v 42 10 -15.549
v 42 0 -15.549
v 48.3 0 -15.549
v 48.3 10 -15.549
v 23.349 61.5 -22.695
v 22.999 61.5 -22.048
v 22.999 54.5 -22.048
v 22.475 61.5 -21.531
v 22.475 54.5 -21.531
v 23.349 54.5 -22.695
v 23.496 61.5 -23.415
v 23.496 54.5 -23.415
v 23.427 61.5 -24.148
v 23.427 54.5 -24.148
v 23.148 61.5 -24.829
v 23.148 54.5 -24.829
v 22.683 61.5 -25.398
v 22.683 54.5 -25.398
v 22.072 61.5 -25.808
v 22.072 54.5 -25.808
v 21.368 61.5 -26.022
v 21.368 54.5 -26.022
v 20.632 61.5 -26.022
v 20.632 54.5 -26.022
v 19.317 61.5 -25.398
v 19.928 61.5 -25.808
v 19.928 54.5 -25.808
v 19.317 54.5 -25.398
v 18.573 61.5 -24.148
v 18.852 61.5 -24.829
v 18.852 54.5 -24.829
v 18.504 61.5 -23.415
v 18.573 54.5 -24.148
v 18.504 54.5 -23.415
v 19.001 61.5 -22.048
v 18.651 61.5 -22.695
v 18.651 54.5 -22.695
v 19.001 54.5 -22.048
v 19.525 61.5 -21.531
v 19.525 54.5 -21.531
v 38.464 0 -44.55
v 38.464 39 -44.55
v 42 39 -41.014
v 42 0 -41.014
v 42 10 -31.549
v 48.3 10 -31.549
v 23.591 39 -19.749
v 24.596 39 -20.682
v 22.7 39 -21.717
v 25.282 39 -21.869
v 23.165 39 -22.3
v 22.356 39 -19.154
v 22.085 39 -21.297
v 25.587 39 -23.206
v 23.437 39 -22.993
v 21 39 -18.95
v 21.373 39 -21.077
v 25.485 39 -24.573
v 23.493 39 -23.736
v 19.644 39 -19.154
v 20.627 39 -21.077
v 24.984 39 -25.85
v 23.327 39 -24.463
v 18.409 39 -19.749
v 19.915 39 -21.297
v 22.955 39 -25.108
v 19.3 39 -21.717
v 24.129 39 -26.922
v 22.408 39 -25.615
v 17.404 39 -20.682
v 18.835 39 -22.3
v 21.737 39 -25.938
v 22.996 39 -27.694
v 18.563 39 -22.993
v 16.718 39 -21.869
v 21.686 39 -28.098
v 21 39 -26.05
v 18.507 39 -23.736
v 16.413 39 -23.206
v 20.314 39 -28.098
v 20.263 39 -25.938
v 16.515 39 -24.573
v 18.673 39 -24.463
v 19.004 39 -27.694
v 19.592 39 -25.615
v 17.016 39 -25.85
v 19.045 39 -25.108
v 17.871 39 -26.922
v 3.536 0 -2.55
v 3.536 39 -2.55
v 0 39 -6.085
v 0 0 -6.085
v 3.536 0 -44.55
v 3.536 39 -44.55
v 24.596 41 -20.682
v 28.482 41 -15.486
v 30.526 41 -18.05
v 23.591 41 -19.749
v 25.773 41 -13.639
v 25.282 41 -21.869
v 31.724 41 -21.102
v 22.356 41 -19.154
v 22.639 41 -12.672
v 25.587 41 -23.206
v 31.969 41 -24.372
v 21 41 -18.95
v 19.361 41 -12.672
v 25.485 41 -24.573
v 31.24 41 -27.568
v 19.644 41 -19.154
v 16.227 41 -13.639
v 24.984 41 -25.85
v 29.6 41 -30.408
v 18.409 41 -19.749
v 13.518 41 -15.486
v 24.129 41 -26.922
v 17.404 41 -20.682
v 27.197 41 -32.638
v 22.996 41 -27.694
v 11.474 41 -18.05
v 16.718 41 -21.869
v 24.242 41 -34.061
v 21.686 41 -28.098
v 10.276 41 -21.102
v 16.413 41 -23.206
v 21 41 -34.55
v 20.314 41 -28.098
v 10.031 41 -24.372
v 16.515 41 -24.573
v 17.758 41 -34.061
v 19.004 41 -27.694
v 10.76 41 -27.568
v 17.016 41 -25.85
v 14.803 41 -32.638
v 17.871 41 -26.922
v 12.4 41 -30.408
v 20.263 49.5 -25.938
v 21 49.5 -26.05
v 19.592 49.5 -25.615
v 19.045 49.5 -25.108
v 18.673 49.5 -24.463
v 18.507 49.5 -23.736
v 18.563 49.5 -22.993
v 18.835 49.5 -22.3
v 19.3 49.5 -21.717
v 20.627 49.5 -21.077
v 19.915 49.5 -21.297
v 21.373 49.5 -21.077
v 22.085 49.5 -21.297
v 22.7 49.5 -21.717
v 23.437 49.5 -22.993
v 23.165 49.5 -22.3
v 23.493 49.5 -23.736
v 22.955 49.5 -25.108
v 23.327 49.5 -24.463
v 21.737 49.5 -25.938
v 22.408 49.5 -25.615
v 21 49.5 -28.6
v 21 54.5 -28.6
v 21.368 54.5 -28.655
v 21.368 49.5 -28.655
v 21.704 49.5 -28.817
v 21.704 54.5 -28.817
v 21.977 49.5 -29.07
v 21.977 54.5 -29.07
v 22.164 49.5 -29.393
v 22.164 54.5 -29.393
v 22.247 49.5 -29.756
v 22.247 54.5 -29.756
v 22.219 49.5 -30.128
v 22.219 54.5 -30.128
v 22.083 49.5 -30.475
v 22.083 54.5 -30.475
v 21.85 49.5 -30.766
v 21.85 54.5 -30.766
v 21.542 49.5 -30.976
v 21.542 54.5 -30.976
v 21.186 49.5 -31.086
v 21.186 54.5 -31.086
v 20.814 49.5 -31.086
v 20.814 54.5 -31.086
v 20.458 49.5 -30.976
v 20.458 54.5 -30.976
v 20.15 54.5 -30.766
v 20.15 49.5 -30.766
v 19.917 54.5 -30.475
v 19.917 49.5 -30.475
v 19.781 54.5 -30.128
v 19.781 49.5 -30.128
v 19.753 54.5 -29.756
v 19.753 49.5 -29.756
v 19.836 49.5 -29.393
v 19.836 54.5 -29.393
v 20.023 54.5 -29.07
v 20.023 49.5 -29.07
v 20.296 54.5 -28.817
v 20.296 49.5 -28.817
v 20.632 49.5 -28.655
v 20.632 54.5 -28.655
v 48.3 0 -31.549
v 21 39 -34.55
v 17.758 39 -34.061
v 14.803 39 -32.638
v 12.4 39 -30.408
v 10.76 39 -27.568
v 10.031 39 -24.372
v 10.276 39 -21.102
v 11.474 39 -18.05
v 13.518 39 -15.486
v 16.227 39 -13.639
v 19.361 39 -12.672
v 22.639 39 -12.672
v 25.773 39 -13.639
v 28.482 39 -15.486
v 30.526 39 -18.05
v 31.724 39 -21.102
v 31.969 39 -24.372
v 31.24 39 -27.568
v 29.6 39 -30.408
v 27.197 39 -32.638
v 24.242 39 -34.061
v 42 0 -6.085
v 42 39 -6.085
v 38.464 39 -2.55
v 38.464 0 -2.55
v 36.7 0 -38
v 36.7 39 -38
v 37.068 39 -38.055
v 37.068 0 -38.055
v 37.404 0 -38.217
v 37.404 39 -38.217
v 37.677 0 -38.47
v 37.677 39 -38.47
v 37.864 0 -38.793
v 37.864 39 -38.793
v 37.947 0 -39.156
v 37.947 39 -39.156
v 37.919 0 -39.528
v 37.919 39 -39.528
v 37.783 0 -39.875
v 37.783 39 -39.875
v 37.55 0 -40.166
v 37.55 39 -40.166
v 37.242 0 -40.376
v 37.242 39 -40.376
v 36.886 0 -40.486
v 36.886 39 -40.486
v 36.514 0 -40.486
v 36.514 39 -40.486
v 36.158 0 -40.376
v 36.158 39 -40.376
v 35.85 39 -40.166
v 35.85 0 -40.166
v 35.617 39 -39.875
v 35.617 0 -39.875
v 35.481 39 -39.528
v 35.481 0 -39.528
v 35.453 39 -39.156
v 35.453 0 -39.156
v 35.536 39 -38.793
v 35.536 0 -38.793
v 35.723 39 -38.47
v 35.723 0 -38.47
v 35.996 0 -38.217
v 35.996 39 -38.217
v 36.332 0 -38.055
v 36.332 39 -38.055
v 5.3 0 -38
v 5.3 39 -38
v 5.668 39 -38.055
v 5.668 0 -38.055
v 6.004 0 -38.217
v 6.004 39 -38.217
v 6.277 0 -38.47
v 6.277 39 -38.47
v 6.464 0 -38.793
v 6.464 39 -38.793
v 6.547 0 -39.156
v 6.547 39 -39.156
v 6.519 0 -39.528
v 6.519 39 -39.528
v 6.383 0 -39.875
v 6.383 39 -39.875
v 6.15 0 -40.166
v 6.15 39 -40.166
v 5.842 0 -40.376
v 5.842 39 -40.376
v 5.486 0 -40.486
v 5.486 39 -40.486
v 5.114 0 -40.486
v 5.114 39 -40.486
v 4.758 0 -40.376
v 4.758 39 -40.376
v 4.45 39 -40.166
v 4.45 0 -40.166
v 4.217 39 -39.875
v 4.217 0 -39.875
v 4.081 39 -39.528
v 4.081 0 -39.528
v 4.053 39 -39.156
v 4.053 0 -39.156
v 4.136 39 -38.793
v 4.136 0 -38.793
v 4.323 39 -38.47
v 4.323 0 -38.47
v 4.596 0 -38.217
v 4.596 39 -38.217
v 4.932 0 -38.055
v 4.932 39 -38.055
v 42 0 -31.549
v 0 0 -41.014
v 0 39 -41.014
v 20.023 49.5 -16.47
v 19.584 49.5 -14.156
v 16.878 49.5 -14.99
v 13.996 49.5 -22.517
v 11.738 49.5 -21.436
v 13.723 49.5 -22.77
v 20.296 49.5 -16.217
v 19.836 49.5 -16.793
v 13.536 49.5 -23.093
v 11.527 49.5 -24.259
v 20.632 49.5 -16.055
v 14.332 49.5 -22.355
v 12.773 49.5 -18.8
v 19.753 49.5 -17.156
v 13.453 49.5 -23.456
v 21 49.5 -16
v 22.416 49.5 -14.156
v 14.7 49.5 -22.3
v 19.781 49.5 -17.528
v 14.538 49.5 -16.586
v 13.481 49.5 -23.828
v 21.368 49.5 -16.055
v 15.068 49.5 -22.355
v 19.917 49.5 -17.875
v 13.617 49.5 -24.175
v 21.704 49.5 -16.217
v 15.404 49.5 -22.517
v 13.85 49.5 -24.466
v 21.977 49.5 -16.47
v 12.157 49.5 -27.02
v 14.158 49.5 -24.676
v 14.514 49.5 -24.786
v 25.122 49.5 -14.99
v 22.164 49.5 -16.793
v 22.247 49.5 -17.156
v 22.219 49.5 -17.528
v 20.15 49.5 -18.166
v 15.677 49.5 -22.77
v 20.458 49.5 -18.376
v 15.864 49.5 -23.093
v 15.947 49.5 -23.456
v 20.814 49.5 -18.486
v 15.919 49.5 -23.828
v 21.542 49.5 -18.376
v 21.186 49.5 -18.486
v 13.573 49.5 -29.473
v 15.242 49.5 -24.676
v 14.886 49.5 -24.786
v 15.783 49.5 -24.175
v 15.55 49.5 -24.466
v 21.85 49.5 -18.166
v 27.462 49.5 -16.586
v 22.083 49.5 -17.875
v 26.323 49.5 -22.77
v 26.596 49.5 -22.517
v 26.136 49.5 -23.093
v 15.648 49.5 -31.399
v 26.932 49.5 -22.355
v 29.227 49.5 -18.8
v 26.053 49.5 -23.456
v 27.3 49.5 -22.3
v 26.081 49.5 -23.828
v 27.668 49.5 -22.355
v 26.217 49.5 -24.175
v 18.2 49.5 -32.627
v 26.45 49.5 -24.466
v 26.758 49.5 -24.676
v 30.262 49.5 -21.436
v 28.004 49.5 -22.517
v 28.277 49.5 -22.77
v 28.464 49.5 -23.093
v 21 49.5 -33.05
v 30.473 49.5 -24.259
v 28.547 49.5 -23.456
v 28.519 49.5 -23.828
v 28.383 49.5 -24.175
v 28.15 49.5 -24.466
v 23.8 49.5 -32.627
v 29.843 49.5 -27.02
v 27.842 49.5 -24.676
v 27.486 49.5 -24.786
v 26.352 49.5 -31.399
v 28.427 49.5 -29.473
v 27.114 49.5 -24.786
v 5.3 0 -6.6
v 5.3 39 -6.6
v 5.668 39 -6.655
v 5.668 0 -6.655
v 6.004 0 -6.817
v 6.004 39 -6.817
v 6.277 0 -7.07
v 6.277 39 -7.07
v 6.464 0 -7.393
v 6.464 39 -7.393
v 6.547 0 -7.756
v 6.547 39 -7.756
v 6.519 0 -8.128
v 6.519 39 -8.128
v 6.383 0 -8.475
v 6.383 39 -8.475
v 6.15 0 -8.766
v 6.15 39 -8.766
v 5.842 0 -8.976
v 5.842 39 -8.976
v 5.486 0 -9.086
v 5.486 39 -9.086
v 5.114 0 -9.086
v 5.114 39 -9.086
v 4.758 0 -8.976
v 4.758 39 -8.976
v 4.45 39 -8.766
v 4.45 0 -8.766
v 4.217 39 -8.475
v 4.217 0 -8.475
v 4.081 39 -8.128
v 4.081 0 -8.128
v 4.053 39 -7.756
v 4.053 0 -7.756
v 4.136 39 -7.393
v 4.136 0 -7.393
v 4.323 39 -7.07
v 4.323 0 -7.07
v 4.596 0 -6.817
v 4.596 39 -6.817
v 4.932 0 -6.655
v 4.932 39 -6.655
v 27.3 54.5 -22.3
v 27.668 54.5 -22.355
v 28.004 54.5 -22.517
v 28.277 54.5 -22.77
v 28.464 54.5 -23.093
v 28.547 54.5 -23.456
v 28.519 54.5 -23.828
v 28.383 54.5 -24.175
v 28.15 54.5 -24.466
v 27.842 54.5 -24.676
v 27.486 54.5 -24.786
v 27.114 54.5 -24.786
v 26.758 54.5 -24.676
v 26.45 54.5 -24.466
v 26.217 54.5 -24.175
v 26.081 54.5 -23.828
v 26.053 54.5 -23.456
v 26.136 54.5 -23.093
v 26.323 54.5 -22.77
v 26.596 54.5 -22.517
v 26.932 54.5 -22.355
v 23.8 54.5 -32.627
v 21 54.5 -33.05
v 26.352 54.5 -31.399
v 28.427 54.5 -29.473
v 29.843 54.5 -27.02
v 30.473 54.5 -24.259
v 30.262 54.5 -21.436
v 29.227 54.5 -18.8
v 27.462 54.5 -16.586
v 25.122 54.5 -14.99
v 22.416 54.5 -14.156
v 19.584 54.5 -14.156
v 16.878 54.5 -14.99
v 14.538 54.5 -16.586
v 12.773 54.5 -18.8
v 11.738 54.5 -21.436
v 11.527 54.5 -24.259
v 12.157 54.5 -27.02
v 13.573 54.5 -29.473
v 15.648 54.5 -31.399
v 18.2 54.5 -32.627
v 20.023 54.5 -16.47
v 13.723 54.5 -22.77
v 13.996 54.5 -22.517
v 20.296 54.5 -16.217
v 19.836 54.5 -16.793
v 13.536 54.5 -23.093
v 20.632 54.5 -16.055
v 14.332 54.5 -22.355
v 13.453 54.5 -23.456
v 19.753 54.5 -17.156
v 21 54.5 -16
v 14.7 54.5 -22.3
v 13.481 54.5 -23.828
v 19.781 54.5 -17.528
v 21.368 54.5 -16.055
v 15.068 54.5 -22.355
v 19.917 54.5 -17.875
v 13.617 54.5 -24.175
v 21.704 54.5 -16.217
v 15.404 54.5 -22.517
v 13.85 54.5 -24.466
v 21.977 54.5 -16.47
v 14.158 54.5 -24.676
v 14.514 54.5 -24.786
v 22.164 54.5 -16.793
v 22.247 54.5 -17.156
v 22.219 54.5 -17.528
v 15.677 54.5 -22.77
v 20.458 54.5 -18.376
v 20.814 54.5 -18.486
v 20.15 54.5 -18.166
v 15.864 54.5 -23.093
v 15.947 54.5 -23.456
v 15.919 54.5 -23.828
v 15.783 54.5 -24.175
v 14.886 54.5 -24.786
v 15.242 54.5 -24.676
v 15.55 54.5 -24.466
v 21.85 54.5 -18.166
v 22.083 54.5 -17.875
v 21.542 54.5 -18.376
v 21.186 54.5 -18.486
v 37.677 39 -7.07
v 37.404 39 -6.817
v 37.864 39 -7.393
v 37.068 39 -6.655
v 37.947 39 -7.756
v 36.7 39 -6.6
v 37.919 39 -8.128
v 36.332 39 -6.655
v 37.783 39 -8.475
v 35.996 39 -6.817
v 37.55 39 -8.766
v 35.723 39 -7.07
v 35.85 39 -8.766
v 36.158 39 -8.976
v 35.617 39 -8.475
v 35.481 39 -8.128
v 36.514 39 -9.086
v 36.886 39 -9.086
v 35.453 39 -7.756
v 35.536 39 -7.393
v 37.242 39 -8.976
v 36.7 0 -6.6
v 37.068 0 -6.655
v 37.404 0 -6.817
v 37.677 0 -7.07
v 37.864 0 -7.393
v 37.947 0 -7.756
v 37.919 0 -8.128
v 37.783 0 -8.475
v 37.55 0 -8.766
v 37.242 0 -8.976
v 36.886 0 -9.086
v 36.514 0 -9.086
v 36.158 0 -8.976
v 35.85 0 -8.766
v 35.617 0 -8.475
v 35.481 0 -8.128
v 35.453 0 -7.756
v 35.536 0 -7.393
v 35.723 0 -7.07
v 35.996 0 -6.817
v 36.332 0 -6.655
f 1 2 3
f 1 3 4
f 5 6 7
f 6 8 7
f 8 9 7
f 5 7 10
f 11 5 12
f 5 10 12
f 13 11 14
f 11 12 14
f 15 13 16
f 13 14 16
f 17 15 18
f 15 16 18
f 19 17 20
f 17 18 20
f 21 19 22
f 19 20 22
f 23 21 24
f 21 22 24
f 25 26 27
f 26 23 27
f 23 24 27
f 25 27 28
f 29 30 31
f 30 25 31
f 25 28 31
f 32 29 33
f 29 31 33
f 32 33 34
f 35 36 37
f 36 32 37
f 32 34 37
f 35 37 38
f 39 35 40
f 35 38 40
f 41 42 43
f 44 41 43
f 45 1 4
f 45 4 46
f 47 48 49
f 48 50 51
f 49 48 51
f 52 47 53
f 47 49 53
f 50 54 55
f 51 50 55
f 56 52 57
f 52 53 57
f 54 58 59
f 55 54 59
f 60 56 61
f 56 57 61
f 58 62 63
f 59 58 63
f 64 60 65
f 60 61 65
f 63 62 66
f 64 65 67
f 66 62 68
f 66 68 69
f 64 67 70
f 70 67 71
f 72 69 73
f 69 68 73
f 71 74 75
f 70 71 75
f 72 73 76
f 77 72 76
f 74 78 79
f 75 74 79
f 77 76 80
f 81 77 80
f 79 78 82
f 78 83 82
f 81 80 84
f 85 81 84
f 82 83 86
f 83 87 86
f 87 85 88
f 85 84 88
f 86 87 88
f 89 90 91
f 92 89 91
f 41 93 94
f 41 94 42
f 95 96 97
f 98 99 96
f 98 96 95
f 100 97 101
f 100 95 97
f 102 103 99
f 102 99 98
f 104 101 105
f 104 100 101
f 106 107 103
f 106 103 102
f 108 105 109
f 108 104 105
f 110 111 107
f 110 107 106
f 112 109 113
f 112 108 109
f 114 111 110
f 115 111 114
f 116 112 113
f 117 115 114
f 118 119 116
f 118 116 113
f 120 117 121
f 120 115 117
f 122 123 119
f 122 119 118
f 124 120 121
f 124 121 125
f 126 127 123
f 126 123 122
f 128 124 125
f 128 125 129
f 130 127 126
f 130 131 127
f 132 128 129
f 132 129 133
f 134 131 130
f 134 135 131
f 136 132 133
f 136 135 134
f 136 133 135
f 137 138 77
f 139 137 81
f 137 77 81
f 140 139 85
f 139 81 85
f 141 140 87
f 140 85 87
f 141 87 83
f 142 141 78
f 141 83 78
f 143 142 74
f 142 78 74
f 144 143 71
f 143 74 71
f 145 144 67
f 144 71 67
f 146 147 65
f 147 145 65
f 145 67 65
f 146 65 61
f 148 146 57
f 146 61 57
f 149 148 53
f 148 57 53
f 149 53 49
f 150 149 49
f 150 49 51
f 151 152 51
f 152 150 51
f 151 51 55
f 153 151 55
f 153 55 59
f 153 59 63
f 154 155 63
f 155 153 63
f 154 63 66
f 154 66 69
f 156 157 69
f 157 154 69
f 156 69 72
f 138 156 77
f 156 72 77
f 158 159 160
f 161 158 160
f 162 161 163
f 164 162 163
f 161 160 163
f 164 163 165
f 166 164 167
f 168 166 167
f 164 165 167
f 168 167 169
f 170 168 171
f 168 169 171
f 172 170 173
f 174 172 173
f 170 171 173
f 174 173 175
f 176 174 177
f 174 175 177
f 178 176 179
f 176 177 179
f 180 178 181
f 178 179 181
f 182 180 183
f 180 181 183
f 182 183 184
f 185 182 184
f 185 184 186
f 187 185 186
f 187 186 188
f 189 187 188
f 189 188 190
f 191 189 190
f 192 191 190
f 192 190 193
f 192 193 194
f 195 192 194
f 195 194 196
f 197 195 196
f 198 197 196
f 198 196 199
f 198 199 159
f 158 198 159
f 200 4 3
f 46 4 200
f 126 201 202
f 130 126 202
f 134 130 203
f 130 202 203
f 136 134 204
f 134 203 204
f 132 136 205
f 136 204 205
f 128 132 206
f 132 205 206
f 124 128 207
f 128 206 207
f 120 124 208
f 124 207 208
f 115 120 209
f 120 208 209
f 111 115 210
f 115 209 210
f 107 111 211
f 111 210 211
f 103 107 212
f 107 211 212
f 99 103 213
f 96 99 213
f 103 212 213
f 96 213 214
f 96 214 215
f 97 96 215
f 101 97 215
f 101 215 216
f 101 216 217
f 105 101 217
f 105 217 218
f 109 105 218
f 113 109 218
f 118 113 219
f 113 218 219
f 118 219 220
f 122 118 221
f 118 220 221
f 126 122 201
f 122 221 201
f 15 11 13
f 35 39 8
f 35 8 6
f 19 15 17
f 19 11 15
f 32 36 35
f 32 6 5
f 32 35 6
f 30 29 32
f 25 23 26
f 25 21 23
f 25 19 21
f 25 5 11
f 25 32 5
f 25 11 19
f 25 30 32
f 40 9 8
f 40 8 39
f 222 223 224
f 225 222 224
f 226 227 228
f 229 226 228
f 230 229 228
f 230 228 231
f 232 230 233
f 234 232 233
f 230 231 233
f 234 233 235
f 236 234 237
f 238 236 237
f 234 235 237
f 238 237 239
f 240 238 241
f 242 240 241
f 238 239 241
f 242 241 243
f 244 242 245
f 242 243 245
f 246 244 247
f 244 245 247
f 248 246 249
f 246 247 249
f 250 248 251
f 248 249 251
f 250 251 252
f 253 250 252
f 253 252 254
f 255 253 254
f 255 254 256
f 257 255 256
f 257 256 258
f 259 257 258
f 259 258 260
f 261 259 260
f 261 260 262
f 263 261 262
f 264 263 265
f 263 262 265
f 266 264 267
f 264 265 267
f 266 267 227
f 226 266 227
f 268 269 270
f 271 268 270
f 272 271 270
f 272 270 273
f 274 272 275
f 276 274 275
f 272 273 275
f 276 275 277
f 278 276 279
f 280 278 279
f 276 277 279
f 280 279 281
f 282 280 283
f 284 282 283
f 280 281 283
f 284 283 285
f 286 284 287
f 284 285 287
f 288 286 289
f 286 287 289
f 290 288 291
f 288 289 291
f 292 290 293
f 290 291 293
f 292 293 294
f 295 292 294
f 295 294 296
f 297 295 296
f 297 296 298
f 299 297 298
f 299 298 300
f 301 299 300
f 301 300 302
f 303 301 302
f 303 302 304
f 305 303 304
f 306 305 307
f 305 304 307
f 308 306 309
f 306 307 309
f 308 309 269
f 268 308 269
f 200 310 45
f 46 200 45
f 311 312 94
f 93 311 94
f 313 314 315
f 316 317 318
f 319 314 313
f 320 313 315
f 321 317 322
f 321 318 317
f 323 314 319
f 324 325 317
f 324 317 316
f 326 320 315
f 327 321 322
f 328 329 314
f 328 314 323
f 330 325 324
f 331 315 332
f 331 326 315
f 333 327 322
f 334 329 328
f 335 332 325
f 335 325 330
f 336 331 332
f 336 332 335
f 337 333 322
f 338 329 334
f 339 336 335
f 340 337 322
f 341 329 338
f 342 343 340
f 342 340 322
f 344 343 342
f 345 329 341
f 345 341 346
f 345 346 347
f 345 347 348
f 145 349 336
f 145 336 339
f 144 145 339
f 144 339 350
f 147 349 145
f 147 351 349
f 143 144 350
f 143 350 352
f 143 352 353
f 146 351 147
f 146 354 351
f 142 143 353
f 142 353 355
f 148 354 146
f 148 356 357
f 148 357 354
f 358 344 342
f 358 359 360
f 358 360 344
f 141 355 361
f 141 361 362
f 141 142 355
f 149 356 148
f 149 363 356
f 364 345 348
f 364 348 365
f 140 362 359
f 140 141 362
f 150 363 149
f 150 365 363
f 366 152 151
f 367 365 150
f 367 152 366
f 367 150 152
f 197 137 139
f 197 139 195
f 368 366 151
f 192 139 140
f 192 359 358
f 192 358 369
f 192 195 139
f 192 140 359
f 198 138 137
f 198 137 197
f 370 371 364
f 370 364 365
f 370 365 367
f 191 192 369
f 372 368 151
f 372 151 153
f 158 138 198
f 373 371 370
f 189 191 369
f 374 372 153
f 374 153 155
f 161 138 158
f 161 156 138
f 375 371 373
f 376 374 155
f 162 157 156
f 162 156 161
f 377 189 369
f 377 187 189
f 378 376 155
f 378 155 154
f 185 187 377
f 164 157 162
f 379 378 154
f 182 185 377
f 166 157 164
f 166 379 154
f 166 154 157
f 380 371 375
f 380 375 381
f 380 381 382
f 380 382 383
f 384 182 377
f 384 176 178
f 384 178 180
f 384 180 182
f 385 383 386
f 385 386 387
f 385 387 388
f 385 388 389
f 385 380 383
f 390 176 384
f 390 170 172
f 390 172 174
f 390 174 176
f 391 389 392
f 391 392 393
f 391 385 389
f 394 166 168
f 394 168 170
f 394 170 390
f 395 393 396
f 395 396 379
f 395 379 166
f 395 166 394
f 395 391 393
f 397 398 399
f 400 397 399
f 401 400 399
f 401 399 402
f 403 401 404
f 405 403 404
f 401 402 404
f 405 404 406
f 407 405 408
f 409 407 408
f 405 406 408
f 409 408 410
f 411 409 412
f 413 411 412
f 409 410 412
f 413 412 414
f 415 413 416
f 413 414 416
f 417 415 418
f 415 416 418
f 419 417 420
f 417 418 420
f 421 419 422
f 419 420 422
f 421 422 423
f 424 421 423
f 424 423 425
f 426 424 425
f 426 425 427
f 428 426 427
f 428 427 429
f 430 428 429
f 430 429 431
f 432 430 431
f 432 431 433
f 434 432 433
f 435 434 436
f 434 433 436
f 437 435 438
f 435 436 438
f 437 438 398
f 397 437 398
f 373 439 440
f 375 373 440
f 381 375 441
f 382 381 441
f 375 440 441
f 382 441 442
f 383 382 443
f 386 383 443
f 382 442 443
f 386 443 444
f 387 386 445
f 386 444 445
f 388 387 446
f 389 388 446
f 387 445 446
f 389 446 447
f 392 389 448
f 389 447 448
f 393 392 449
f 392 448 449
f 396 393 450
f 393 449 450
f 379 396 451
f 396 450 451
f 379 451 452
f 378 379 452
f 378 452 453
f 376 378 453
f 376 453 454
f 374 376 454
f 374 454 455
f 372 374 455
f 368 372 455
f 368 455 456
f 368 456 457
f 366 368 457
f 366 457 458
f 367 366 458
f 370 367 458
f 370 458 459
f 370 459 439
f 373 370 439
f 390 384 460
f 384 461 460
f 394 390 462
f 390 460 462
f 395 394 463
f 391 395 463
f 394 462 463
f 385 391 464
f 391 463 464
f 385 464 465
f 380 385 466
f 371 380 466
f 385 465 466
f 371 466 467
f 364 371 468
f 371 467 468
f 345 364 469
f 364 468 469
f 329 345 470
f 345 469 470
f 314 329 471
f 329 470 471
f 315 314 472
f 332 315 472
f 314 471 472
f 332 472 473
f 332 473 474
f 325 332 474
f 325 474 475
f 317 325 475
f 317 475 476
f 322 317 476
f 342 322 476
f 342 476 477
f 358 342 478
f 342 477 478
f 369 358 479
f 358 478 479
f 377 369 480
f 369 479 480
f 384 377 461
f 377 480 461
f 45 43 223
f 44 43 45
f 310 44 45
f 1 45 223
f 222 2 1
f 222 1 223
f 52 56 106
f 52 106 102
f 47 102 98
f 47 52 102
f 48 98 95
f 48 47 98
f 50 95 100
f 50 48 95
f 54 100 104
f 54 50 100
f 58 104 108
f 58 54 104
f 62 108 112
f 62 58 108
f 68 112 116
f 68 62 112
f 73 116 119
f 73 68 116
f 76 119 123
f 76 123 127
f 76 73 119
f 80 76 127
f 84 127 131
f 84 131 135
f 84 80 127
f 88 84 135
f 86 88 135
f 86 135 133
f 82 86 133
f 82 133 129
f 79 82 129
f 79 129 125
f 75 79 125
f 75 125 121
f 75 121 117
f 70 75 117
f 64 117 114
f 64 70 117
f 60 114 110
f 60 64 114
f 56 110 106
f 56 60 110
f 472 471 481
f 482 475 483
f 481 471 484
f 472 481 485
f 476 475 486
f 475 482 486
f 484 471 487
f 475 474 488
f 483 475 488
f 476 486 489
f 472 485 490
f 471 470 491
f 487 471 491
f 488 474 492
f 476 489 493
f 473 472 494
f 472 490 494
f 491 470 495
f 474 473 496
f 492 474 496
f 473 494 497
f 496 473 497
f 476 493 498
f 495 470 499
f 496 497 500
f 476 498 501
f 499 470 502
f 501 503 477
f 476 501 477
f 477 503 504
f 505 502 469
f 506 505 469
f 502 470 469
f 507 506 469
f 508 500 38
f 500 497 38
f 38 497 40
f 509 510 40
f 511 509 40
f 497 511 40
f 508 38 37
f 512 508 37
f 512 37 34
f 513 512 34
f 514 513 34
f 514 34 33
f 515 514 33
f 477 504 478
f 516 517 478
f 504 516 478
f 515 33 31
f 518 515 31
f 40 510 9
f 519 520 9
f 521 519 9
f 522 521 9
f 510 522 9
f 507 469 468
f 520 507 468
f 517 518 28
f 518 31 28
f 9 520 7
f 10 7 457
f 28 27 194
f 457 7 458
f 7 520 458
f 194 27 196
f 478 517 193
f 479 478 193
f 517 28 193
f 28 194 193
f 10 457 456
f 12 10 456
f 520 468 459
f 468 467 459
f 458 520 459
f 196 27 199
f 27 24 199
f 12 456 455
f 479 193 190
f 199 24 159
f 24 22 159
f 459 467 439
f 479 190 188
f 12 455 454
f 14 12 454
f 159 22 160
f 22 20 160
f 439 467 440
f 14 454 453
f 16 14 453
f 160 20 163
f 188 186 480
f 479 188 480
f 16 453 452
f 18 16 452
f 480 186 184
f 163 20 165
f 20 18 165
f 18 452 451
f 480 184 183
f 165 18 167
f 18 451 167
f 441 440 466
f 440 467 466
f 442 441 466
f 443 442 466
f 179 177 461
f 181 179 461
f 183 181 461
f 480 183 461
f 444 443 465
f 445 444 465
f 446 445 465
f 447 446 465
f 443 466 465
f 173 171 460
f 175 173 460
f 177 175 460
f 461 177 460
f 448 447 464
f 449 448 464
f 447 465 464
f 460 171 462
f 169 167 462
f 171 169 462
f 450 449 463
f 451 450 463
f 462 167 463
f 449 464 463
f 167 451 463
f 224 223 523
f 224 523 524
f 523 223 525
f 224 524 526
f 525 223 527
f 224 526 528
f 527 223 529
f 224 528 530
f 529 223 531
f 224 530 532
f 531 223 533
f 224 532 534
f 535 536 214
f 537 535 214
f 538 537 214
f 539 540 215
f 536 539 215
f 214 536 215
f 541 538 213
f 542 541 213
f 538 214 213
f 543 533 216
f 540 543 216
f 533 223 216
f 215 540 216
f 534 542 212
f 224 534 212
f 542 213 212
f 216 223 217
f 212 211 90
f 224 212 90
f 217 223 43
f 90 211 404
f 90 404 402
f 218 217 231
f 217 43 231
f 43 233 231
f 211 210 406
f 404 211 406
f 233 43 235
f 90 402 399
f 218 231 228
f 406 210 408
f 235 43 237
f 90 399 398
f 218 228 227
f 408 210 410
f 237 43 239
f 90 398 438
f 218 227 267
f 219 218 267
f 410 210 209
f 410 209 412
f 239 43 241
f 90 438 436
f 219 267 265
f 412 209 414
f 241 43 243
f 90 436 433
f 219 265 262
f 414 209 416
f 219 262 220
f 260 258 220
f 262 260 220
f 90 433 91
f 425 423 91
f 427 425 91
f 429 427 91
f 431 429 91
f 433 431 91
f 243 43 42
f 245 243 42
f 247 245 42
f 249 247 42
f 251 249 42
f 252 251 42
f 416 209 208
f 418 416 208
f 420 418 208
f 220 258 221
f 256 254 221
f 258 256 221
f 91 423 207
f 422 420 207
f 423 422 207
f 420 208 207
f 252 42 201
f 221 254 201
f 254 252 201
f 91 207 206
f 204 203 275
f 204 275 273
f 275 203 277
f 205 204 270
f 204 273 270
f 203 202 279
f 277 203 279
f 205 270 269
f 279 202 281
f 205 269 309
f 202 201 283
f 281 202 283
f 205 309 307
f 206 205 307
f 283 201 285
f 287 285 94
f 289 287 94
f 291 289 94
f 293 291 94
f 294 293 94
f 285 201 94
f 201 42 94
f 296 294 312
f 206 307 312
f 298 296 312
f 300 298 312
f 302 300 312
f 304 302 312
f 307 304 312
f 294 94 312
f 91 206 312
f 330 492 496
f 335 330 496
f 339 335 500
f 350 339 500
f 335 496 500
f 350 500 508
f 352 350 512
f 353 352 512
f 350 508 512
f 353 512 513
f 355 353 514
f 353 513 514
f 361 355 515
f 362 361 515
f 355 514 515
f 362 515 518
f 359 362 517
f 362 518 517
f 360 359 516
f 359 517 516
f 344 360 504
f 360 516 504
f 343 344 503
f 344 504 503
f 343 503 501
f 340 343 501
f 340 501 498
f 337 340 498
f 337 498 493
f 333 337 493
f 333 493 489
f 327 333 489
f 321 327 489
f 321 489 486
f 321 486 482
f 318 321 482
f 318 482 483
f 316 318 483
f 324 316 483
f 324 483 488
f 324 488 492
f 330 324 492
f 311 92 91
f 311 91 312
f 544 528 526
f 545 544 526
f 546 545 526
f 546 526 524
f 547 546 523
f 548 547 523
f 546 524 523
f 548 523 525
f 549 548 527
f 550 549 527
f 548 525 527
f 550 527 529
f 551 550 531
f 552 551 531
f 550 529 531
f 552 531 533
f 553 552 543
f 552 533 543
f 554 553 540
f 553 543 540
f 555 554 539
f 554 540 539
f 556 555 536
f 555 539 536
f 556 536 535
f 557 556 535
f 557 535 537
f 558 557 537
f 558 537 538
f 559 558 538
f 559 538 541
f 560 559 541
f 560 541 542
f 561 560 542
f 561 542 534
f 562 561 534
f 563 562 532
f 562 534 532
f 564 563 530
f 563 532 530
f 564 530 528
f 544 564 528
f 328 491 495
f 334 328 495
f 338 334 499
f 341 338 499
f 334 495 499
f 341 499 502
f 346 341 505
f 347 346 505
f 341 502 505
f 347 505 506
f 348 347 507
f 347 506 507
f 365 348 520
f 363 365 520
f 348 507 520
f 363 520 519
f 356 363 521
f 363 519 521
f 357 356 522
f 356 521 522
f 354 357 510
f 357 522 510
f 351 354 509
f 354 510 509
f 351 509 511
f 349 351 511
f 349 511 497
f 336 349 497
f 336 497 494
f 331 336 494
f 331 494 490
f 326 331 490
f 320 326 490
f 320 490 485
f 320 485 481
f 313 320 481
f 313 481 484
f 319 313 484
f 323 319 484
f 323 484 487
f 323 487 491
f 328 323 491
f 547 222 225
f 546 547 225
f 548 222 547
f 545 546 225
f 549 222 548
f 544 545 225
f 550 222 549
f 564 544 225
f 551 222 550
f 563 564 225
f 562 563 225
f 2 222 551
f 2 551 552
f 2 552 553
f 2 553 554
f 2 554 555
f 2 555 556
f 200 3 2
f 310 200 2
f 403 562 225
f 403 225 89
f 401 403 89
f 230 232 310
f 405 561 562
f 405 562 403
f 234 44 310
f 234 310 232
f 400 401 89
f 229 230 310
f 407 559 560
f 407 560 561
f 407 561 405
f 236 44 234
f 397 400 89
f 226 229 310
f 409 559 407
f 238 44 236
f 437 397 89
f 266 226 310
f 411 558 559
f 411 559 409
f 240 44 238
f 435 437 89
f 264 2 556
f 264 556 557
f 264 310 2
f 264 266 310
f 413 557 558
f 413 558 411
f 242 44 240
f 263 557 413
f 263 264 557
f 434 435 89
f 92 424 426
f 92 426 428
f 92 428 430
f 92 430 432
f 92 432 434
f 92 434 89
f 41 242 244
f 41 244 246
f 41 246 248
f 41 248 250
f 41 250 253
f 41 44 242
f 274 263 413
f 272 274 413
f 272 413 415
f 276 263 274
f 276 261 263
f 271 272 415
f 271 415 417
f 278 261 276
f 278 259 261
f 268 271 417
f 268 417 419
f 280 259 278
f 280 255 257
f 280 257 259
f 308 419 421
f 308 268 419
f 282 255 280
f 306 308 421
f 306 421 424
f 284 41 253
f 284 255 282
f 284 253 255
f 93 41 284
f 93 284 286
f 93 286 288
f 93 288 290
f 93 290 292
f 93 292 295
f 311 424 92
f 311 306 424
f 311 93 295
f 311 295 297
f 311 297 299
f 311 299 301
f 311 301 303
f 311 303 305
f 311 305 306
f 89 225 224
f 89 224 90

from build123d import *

# Parameters (mm, degrees)
BOSS_EXTRU_1_DEPTH      = 39
ESQUISSE2_R             = 1.25
ENL_V_MAT_EXTRU_1_DEPTH = 39
ESQUISSE3_R             = 11
ESQUISSE3_R_2           = 4.6
BOSS_EXTRU_2_DEPTH      = 2
ESQUISSE4_R             = 2.5
BOSS_EXTRU_3_DEPTH      = 22.5
ESQUISSE5_W             = 9.5
ESQUISSE5_H             = 5
ENL_V_MAT_EXTRU_2_REACH = 83.969
ESQUISSE6_R             = 1.25
ENL_V_START             = -7
ENL_V_MAT_EXTRU_4_DEPTH = 7
ESQUISSE9_W             = 16
ESQUISSE9_H             = 10
BOSS_EXTRU_4_DEPTH      = 6.3


with BuildPart() as part:
    # Esquisse1 → Boss.-Extru.1 (new body)
    with BuildSketch(Plane(origin=(0, 0, 0), x_dir=(1, 0, 0), z_dir=(0, 1, 0))):
        Polygon((3.535533906, 2.549558154), (0, 6.08509206), (0, 41.014024248), (3.535533906, 44.549558154), (38.464466094, 44.549558154), (42, 41.014024248), (42, 6.08509206), (38.464466094, 2.549558154), align=None)
    extrude(amount=BOSS_EXTRU_1_DEPTH)

    # Esquisse2 → Enlèv. mat.-Extru.1 (cut)
    with BuildSketch(Plane(origin=(0, 39, 0), x_dir=(1, 0, 0), z_dir=(0, 1, 0))):
        with Locations(Location((5.3, 39.249558154, 0), (0, 0, 270))):
            Circle(ESQUISSE2_R)
        with Locations(Location((36.7, 39.249558154, 0), (0, 0, 270))):
            Circle(ESQUISSE2_R)
        with Locations(Location((36.7, 7.849558154, 0), (0, 0, 270))):
            Circle(ESQUISSE2_R)
        with Locations(Location((5.3, 7.849558154, 0), (0, 0, 270))):
            Circle(ESQUISSE2_R)
    extrude(amount=-ENL_V_MAT_EXTRU_1_DEPTH, mode=Mode.SUBTRACT)

    # Esquisse3 → Boss.-Extru.2 (add)
    with BuildSketch(Plane(origin=(0, 39, 0), x_dir=(1, 0, 0), z_dir=(0, 1, 0))):
        with Locations(Location((21, 23.549558154, 0), (0, 0, 90))):
            Circle(ESQUISSE3_R)
        with Locations(Location((21, 23.549558154, 0), (0, 0, 270))):
            Circle(ESQUISSE3_R_2, mode=Mode.SUBTRACT)
    extrude(amount=BOSS_EXTRU_2_DEPTH)

    # Esquisse4 → Boss.-Extru.3 (add)
    with BuildSketch(Plane(origin=(0, 39, 0), x_dir=(1, 0, 0), z_dir=(0, 1, 0))):
        with Locations(Location((21, 23.549558154, 0), (0, 0, 90))):
            Circle(ESQUISSE4_R)
    extrude(amount=BOSS_EXTRU_3_DEPTH)

    # Esquisse5 → Révolution1 (revolve)
    with BuildSketch(Plane(origin=(21, 0, 0), x_dir=(0, 0, -1), z_dir=(1, 0, 0)), mode=Mode.PRIVATE) as r_volution1_sk:
        with Locations((18.799558154, 52)):
            Rectangle(ESQUISSE5_W, ESQUISSE5_H)
    revolve(r_volution1_sk.sketch.rotate(Axis((21, 61.5, -23.549558154), (0, -1, 0)), 180), axis=Axis((21, 61.5, -23.549558154), (0, -1, 0)))

    # Esquisse6 → Enlèv. mat.-Extru.2 (cut, up to next)
    with BuildSketch(Plane(origin=(0, 54.5, 0), x_dir=(1, 0, 0), z_dir=(0, 1, 0)), mode=Mode.PRIVATE) as enl_v_mat_extru_2_sk1:
        with Locations(Location((27.3, 23.549558154, 0), (0, 0, 270))):
            Circle(ESQUISSE6_R)
    enl_v_mat_extru_2_tool1 = extrude(enl_v_mat_extru_2_sk1.sketch, amount=-ENL_V_MAT_EXTRU_2_REACH, mode=Mode.PRIVATE) & part.part
    # Esquisse6 → Enlèv. mat.-Extru.2 (cut, up to next)
    with BuildSketch(Plane(origin=(0, 54.5, 0), x_dir=(1, 0, 0), z_dir=(0, 1, 0)), mode=Mode.PRIVATE) as enl_v_mat_extru_2_sk2:
        with Locations(Location((21, 17.249558154, 0), (0, 0, 270))):
            Circle(ESQUISSE6_R)
    enl_v_mat_extru_2_tool2 = extrude(enl_v_mat_extru_2_sk2.sketch, amount=-ENL_V_MAT_EXTRU_2_REACH, mode=Mode.PRIVATE) & part.part
    # Esquisse6 → Enlèv. mat.-Extru.2 (cut, up to next)
    with BuildSketch(Plane(origin=(0, 54.5, 0), x_dir=(1, 0, 0), z_dir=(0, 1, 0)), mode=Mode.PRIVATE) as enl_v_mat_extru_2_sk3:
        with Locations(Location((14.7, 23.549558154, 0), (0, 0, 270))):
            Circle(ESQUISSE6_R)
    enl_v_mat_extru_2_tool3 = extrude(enl_v_mat_extru_2_sk3.sketch, amount=-ENL_V_MAT_EXTRU_2_REACH, mode=Mode.PRIVATE) & part.part
    # Esquisse6 → Enlèv. mat.-Extru.2 (cut, up to next)
    with BuildSketch(Plane(origin=(0, 54.5, 0), x_dir=(1, 0, 0), z_dir=(0, 1, 0)), mode=Mode.PRIVATE) as enl_v_mat_extru_2_sk4:
        with Locations(Location((21, 29.849558154, 0), (0, 0, 270))):
            Circle(ESQUISSE6_R)
    enl_v_mat_extru_2_tool4 = extrude(enl_v_mat_extru_2_sk4.sketch, amount=-ENL_V_MAT_EXTRU_2_REACH, mode=Mode.PRIVATE) & part.part
    add(enl_v_mat_extru_2_tool1.solids().sort_by_distance((27.3, 54.5, -23.549558))[0], mode=Mode.SUBTRACT)
    add(enl_v_mat_extru_2_tool2.solids().sort_by_distance((21, 54.5, -17.249558))[0], mode=Mode.SUBTRACT)
    add(enl_v_mat_extru_2_tool3.solids().sort_by_distance((14.7, 54.5, -23.549558))[0], mode=Mode.SUBTRACT)
    add(enl_v_mat_extru_2_tool4.solids().sort_by_distance((21, 54.5, -29.849558))[0], mode=Mode.SUBTRACT)

    # Esquisse8 → Enlèv. mat.-Extru.4 (cut)
    with BuildSketch(Plane(origin=(0, 61.5, 0), x_dir=(1, 0, 0), z_dir=(0, 1, 0)).offset(ENL_V_START)):
        with BuildLine():
            Line((22.47490916, 21.530983664), (19.52509084, 21.530983664))
            ThreePointArc((19.52509084, 21.530983664), (21, 21.049558154), (22.47490916, 21.530983664))
        make_face()
    extrude(amount=ENL_V_MAT_EXTRU_4_DEPTH, mode=Mode.SUBTRACT)

    # Esquisse9 → Boss.-Extru.4 (add)
    with BuildSketch(Plane(origin=(42, 0, 0), x_dir=(0, 0, -1), z_dir=(1, 0, 0))):
        with Locations((23.549024248, 5)):
            Rectangle(ESQUISSE9_W, ESQUISSE9_H)
    extrude(amount=BOSS_EXTRU_4_DEPTH)


solid = part.part
